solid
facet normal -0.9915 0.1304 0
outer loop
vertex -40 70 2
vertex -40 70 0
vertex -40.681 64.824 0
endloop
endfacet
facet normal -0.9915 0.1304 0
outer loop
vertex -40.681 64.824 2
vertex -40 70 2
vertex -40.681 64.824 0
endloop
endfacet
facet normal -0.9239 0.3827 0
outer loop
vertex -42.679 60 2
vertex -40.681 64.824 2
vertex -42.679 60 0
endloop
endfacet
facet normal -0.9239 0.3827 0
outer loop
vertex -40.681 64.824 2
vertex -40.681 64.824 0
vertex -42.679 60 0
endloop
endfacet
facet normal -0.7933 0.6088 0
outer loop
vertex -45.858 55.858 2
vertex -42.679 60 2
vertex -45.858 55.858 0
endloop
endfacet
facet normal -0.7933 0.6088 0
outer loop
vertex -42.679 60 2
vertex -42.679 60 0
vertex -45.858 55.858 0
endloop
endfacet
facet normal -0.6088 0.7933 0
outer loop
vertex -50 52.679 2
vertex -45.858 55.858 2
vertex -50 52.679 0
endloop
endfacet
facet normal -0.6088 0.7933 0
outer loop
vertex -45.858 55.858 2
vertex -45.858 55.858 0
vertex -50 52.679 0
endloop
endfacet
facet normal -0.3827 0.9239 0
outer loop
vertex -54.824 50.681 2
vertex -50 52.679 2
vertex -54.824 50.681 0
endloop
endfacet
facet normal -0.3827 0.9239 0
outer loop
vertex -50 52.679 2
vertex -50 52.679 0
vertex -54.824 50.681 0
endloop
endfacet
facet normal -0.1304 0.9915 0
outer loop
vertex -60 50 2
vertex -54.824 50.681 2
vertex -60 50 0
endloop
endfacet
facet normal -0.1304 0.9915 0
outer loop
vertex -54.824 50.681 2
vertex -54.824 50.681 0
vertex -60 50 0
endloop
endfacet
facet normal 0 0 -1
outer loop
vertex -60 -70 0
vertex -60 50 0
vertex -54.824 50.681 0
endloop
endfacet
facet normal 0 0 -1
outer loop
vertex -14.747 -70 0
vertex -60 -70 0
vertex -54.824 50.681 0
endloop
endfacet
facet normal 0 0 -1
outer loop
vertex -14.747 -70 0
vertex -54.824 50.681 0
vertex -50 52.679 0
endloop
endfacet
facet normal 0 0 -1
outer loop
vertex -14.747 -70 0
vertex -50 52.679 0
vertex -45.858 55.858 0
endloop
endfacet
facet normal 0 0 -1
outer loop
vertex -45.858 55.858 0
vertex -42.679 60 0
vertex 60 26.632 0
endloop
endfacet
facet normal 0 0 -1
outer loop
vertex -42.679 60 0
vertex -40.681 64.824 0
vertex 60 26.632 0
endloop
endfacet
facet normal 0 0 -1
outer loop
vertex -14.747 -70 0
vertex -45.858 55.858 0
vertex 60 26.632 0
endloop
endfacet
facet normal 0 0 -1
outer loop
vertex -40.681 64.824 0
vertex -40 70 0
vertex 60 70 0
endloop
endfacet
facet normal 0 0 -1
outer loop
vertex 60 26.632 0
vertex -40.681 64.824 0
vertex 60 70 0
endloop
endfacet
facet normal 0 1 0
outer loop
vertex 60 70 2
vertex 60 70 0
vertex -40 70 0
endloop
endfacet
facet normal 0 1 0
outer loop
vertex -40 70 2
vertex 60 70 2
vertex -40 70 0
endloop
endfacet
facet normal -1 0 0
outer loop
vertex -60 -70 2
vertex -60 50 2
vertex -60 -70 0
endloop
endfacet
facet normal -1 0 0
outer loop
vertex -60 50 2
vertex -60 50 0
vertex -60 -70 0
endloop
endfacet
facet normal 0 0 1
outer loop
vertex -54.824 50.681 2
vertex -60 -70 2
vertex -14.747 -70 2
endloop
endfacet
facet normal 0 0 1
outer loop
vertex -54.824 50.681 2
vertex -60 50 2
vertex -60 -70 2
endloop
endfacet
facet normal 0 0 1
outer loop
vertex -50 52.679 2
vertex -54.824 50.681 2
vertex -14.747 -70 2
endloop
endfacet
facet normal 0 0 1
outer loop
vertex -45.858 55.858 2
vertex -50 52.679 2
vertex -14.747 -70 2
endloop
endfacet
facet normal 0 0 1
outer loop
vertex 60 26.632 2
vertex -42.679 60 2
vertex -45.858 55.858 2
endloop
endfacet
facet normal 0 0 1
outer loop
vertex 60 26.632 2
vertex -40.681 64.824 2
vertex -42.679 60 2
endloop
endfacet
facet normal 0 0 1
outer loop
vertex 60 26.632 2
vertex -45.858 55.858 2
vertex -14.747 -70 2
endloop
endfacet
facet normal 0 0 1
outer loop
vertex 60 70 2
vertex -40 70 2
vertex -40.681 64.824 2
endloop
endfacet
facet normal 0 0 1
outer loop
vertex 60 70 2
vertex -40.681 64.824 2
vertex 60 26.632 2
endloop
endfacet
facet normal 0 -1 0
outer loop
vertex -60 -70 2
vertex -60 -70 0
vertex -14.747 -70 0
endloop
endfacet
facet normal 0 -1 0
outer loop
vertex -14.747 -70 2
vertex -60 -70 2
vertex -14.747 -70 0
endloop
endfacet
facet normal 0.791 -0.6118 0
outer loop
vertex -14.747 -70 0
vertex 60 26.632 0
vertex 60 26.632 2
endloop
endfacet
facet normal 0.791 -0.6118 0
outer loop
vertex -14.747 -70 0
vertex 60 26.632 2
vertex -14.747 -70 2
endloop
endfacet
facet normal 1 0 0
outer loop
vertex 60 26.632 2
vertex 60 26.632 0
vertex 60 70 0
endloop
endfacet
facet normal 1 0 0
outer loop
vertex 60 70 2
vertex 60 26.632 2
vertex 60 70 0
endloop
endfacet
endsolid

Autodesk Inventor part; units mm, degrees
ref_plane "YZ Plane" through (0, 0, 0) normal (1, 0, 0) x (0, 1, 0)
ref_plane "XZ Plane" through (0, 0, 0) normal (0, 1, 0) x (-1, 0, 0)
ref_plane "XY Plane" through (0, 0, 0) normal (0, 0, 1) x (1, 0, 0)
sketch "Sketch1" plane through (0, 0, 0) normal (0, 0, 1) x (1, 0, 0)
  line L0 (-60, -70) -> (60, -70)
  line L1 (60, -70) -> (60, 70)
  line L2 (60, 70) -> (-60, 70)
  line L3 (-60, 70) -> (-60, -70)
  line L4 (-60, -70) -> (60, 70) construction
  line L5 (60, -70) -> (-60, 70) construction
  line L6 (-60, 0) -> (60, 0) construction
  circle A0 centre (-60, 70) radius 20
  line L7 (60, 26.6315) -> (-14.7466, -70)
  point P0 (0, 0)
  point P1 (0, 0)
  point P2 (-40, 70)
  point P3 (-60, 50)
  dimension "d0" = 120
  dimension "d1" = 140
  dimension "d16" = 40
extrude "Plate1" add sketch "Sketch1" along normal blind 2 contours L3 A0 L2 L1 L7 L0
sketch "Sketch2" plane through (0, 0, 0) normal (0, 0, -1) x (-1, 0, 0)
  line L0 (-40, 50) -> (160, 50) construction
  line L1 (160, 50) -> (160, 30) construction
  line L2 (160, 30) -> (-40, 30) construction
  line L3 (-40, 30) -> (-40, 50) construction
  line L4 (-60, 70) -> (40, 70) projected
  line L5 (-60, 26.6315) -> (-60, 70) projected
  point P0 (0, 0)
  point P1 (-48, 100)
  point P2 (60, 70)
  point P3 (-60, -70)
  point P4 (-50, 98)
  dimension "d6" = 200
  dimension "d9" = 20
  dimension "d10" = 20
  dimension "d11" = 20
mark "Mark1"
equation "\"d2\" = Thickness"
equation "\"BendReliefWidth\" = Thickness"
equation "\"BendReliefDepth\" = 0.5 * Thickness"
equation "\"CornerReliefSize\" = 4 * Thickness"
equation "\"MinimumRemnant\" = 2 * Thickness"
equation "\"TransitionRadius\" = BendRadius"
equation "\"JacobiRadiusSize\" = BendRadius"
equation "\"GapSize\" = Thickness"
equation "\"Thickness\" = 2"
equation "\"BendRadius\" = 2.75"
properties part number "TRM 034 motor pillar" material "AISI 304"
